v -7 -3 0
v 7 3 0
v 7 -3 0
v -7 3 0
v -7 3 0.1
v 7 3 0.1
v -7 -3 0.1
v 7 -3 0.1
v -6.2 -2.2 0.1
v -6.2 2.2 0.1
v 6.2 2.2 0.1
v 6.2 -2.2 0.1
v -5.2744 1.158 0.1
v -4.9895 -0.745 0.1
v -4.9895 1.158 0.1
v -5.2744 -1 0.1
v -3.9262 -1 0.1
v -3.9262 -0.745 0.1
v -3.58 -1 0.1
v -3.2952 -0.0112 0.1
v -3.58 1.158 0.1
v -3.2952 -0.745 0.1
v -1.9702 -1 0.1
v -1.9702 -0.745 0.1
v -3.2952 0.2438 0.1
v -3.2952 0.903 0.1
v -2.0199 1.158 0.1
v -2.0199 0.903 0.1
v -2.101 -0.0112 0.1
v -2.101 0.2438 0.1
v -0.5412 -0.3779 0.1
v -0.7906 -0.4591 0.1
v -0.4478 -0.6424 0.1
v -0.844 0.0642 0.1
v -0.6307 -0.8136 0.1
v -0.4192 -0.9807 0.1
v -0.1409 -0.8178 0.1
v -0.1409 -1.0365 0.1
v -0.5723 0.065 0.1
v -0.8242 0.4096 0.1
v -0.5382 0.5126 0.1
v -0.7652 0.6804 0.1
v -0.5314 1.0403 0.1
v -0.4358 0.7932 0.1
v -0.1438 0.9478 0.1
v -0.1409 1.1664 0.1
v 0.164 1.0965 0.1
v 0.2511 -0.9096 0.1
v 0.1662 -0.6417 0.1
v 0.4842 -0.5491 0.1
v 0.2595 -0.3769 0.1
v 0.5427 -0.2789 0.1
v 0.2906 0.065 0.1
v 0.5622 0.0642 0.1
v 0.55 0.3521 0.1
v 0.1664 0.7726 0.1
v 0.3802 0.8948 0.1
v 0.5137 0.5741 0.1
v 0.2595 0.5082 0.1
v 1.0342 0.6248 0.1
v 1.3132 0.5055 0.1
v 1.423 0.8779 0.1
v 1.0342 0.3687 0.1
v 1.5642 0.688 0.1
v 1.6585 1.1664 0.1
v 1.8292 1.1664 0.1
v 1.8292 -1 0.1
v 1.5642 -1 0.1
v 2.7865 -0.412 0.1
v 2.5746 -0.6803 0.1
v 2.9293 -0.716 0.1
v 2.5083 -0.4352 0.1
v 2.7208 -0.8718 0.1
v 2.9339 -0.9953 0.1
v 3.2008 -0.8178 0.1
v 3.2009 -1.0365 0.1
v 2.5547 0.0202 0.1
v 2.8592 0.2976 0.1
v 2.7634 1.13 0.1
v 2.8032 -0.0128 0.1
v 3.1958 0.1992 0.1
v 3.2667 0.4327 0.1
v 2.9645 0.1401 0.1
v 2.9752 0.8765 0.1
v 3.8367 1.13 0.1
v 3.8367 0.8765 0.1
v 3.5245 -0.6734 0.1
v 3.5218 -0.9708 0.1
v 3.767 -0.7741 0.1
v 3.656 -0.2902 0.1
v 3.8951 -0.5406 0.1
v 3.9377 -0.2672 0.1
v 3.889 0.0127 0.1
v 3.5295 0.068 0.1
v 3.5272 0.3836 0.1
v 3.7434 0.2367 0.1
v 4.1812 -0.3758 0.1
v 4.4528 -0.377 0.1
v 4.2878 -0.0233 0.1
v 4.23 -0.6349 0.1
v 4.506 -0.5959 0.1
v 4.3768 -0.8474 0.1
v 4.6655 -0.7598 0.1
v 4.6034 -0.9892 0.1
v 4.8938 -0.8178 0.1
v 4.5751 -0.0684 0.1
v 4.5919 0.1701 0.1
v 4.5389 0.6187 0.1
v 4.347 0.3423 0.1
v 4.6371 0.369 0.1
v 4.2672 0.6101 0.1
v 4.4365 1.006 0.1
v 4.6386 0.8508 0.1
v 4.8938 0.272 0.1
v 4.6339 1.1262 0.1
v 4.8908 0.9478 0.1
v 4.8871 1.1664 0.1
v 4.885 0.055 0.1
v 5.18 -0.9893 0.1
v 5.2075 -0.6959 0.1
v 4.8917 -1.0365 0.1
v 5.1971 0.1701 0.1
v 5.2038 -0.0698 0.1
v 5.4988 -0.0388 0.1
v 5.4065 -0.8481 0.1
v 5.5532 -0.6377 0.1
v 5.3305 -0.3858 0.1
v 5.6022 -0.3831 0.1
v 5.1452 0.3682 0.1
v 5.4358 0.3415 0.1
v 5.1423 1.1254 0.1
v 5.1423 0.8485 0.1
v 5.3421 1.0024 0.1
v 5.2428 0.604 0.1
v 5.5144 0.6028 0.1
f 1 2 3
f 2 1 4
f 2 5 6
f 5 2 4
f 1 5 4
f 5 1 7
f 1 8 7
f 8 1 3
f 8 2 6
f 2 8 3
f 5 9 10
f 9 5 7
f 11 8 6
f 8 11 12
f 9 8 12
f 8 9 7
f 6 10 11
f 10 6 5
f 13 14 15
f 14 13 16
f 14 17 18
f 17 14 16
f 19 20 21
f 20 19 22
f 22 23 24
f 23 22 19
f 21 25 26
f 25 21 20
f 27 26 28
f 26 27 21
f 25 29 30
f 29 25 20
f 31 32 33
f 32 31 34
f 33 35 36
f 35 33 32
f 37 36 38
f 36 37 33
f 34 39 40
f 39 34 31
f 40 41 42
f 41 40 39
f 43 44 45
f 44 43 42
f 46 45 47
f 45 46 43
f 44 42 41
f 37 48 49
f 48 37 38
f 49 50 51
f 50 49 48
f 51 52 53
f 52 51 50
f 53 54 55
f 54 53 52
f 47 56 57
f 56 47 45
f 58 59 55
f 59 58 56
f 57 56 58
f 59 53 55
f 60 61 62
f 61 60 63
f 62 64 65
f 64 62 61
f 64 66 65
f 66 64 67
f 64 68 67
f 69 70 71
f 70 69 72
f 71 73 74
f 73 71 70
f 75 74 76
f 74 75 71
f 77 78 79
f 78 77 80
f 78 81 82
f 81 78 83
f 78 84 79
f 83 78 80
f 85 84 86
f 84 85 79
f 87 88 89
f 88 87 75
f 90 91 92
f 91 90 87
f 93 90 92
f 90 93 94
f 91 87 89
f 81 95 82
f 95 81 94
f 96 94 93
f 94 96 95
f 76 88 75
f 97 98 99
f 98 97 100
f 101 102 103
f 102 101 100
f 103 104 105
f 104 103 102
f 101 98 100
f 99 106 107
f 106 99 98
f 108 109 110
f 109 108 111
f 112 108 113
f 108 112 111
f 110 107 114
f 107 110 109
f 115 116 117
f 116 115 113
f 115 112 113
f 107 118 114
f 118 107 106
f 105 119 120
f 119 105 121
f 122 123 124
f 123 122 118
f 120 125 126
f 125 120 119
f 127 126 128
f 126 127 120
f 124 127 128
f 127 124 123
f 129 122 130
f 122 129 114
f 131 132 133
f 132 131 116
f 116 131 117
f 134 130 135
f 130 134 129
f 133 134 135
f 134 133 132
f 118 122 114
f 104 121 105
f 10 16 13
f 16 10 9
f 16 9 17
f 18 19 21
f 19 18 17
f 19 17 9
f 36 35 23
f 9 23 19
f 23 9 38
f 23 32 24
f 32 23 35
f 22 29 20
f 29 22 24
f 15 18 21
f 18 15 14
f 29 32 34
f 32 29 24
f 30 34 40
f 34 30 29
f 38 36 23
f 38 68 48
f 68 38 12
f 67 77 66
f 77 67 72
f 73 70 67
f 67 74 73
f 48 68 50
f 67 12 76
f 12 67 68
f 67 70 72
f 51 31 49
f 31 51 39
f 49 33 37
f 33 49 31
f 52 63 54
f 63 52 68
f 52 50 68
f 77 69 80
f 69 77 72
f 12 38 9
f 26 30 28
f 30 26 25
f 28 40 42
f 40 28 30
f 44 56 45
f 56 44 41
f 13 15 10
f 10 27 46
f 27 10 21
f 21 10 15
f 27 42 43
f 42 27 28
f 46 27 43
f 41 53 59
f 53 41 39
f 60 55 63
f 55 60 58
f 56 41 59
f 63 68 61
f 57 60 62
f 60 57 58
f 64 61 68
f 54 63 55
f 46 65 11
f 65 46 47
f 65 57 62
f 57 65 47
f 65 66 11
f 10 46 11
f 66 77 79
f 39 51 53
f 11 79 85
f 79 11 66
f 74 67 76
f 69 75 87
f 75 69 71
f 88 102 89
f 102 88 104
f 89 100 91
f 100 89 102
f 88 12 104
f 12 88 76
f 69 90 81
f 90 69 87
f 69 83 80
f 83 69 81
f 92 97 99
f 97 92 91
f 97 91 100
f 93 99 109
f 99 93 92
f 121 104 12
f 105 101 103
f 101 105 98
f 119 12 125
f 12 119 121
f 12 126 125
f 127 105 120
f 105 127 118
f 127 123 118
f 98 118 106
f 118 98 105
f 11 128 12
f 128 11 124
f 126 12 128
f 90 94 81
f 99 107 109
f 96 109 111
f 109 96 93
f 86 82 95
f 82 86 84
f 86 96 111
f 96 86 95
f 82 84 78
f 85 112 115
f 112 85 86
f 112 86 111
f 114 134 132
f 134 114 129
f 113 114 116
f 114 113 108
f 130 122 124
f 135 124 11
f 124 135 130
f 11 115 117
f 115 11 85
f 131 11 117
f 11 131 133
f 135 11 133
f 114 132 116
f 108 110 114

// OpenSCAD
// file: ../p/box5-12.scad
use <../lib.scad>
function ldraw_lib__box5_12() = [
// 0 Box with 5 Faces without Any Edges
// 0 Name: box5-12.dat
// 0 Author: Chris Dee [cwdee]
// 0 !LDRAW_ORG Primitive UPDATE 2009-02
// 0 !LICENSE Licensed under CC BY 2.0 and CC BY 4.0 : see CAreadme.txt
// 
// 0 BFC CERTIFY CCW
  [0,"BFC","CERTIFY"],
  [0,"BFC","CCW"],
// 
// 0 !HISTORY 2009-09-03 [PTadmin] Official Update 2009-02
// 
// 
// 4 16 1 1 1 1 1 -1 -1 1 -1 -1 1 1
  [4,16,1,1,1,1,1,-1,-1,1,-1,-1,1,1],
// 4 16 -1 0 1 1 0 1 1 1 1 -1 1 1
  [4,16,-1,0,1,1,0,1,1,1,1,-1,1,1],
// 4 16 -1 0 -1 -1 0 1 -1 1 1 -1 1 -1
  [4,16,-1,0,-1,-1,0,1,-1,1,1,-1,1,-1],
// 4 16 1 0 -1 -1 0 -1 -1 1 -1 1 1 -1
  [4,16,1,0,-1,-1,0,-1,-1,1,-1,1,1,-1],
// 4 16 1 0 1 1 0 -1 1 1 -1 1 1 1
  [4,16,1,0,1,1,0,-1,1,1,-1,1,1,1],
// 0
];
makepoly(ldraw_lib__box5_12(), line=0.2);
// main file
use <../lib.scad>
use <../p/box5-12.scad>
function ldraw_lib__4521703g() = [
// 0 Sticker  0.8 x  1.8 with Black "LE 0158" and Border
// 0 Name: 4521703g.dat
// 0 Author: J.C. Tchang [tchang]
// 0 !LDRAW_ORG Part UPDATE 2012-01
// 0 !LICENSE Licensed under CC BY 2.0 and CC BY 4.0 : see CAreadme.txt
// 
// 0 BFC CERTIFY CCW
  [0,"BFC","CERTIFY"],
  [0,"BFC","CCW"],
// 
// 0 !HISTORY 2011-07-25 [PTadmin] Official Update 2011-01
// 0 !HISTORY 2012-01-09 [cwdee] Corrected dimensions
// 0 !HISTORY 2012-03-30 [PTadmin] Official Update 2012-01
// 
// 
// 1 16 0 -0.25 0 17.5 0 0 0 0.25 0 0 0 7.5 box5-12.dat
  [1,16,0,-0.25,0,17.5,0,0,0,0.25,0,0,0,7.5, ldraw_lib__box5_12()],
// 4 0 -15.5 -0.25 -5.5 -15.5 -0.25 5.5 -17.5 -0.25 7.5 -17.5 -0.25 -7.5
  [4,0,-15.5,-0.25,-5.5,-15.5,-0.25,5.5,-17.5,-0.25,7.5,-17.5,-0.25,-7.5],
// 4 0 15.5 -0.25 5.5 15.5 -0.25 -5.5 17.5 -0.25 -7.5 17.5 -0.25 7.5
  [4,0,15.5,-0.25,5.5,15.5,-0.25,-5.5,17.5,-0.25,-7.5,17.5,-0.25,7.5],
// 4 0 15.5 -0.25 -5.5 -15.5 -0.25 -5.5 -17.5 -0.25 -7.5 17.5 -0.25 -7.5
  [4,0,15.5,-0.25,-5.5,-15.5,-0.25,-5.5,-17.5,-0.25,-7.5,17.5,-0.25,-7.5],
// 4 0 -15.5 -0.25 5.5 15.5 -0.25 5.5 17.5 -0.25 7.5 -17.5 -0.25 7.5
  [4,0,-15.5,-0.25,5.5,15.5,-0.25,5.5,17.5,-0.25,7.5,-17.5,-0.25,7.5],
// 0 //
// 4 0 -13.1861 -0.25 2.8951 -13.1861 -0.25 -2.5 -12.4738 -0.25 -1.8624 -12.4738 -0.25 2.8951
  [4,0,-13.1861,-0.25,2.8951,-13.1861,-0.25,-2.5,-12.4738,-0.25,-1.8624,-12.4738,-0.25,2.8951],
// 4 0 -12.4738 -0.25 -1.8624 -13.1861 -0.25 -2.5 -9.8156 -0.25 -2.5 -9.8156 -0.25 -1.8624
  [4,0,-12.4738,-0.25,-1.8624,-13.1861,-0.25,-2.5,-9.8156,-0.25,-2.5,-9.8156,-0.25,-1.8624],
// 4 0 -8.9501 -0.25 -2.5 -8.238 -0.25 -1.8624 -8.238 -0.25 -0.0281 -8.9501 -0.25 2.8951
  [4,0,-8.9501,-0.25,-2.5,-8.238,-0.25,-1.8624,-8.238,-0.25,-0.0281,-8.9501,-0.25,2.8951],
// 4 0 -8.238 -0.25 -1.8624 -8.9501 -0.25 -2.5 -4.9255 -0.25 -2.5 -4.9255 -0.25 -1.8624
  [4,0,-8.238,-0.25,-1.8624,-8.9501,-0.25,-2.5,-4.9255,-0.25,-2.5,-4.9255,-0.25,-1.8624],
// 3 0 -8.9501 -0.25 2.8951 -8.238 -0.25 0.6095 -8.238 -0.25 2.2575
  [3,0,-8.9501,-0.25,2.8951,-8.238,-0.25,0.6095,-8.238,-0.25,2.2575],
// 3 0 -8.238 -0.25 0.6095 -8.9501 -0.25 2.8951 -8.238 -0.25 -0.0281
  [3,0,-8.238,-0.25,0.6095,-8.9501,-0.25,2.8951,-8.238,-0.25,-0.0281],
// 4 0 -5.0498 -0.25 2.8951 -8.9501 -0.25 2.8951 -8.238 -0.25 2.2575 -5.0498 -0.25 2.2575
  [4,0,-5.0498,-0.25,2.8951,-8.9501,-0.25,2.8951,-8.238,-0.25,2.2575,-5.0498,-0.25,2.2575],
// 4 0 -8.238 -0.25 0.6095 -8.238 -0.25 -0.0281 -5.2525 -0.25 -0.0281 -5.2525 -0.25 0.6095
  [4,0,-8.238,-0.25,0.6095,-8.238,-0.25,-0.0281,-5.2525,-0.25,-0.0281,-5.2525,-0.25,0.6095],
// 4 0 -1.3531 -0.25 -0.9447 -2.1099 -0.25 0.1606 -1.9766 -0.25 -1.1477 -1.1196 -0.25 -1.6059
  [4,0,-1.3531,-0.25,-0.9447,-2.1099,-0.25,0.1606,-1.9766,-0.25,-1.1477,-1.1196,-0.25,-1.6059],
// 4 0 -1.1196 -0.25 -1.6059 -1.9766 -0.25 -1.1477 -1.5767 -0.25 -2.0339 -1.0481 -0.25 -2.4518
  [4,0,-1.1196,-0.25,-1.6059,-1.9766,-0.25,-1.1477,-1.5767,-0.25,-2.0339,-1.0481,-0.25,-2.4518],
// 4 0 -0.3522 -0.25 -2.0445 -1.1196 -0.25 -1.6059 -1.0481 -0.25 -2.4518 -0.3522 -0.25 -2.5912
  [4,0,-0.3522,-0.25,-2.0445,-1.1196,-0.25,-1.6059,-1.0481,-0.25,-2.4518,-0.3522,-0.25,-2.5912],
// 4 0 -2.1099 -0.25 0.1606 -1.3531 -0.25 -0.9447 -1.4307 -0.25 0.1625 -2.0606 -0.25 1.024
  [4,0,-2.1099,-0.25,0.1606,-1.3531,-0.25,-0.9447,-1.4307,-0.25,0.1625,-2.0606,-0.25,1.024],
// 4 0 -1.3454 -0.25 1.2815 -1.913 -0.25 1.701 -2.0606 -0.25 1.024 -1.4307 -0.25 0.1625
  [4,0,-1.3454,-0.25,1.2815,-1.913,-0.25,1.701,-2.0606,-0.25,1.024,-1.4307,-0.25,0.1625],
// 4 0 -1.3284 -0.25 2.6007 -1.913 -0.25 1.701 -1.0894 -0.25 1.983 -0.3596 -0.25 2.3694
  [4,0,-1.3284,-0.25,2.6007,-1.913,-0.25,1.701,-1.0894,-0.25,1.983,-0.3596,-0.25,2.3694],
// 4 0 -0.3522 -0.25 2.9161 -1.3284 -0.25 2.6007 -0.3596 -0.25 2.3694 0.41 -0.25 2.7412
  [4,0,-0.3522,-0.25,2.9161,-1.3284,-0.25,2.6007,-0.3596,-0.25,2.3694,0.41,-0.25,2.7412],
// 3 0 -1.0894 -0.25 1.983 -1.913 -0.25 1.701 -1.3454 -0.25 1.2815
  [3,0,-1.0894,-0.25,1.983,-1.913,-0.25,1.701,-1.3454,-0.25,1.2815],
// 4 0 0.6278 -0.25 -2.274 0.4155 -0.25 -1.6043 -0.3522 -0.25 -2.0445 -0.3522 -0.25 -2.5912
  [4,0,0.6278,-0.25,-2.274,0.4155,-0.25,-1.6043,-0.3522,-0.25,-2.0445,-0.3522,-0.25,-2.5912],
// 4 0 0.4155 -0.25 -1.6043 0.6278 -0.25 -2.274 1.2105 -0.25 -1.3727 0.6487 -0.25 -0.9423
  [4,0,0.4155,-0.25,-1.6043,0.6278,-0.25,-2.274,1.2105,-0.25,-1.3727,0.6487,-0.25,-0.9423],
// 4 0 0.6487 -0.25 -0.9423 1.2105 -0.25 -1.3727 1.3568 -0.25 -0.6972 0.7264 -0.25 0.1625
  [4,0,0.6487,-0.25,-0.9423,1.2105,-0.25,-1.3727,1.3568,-0.25,-0.6972,0.7264,-0.25,0.1625],
// 4 0 0.7264 -0.25 0.1625 1.3568 -0.25 -0.6972 1.4056 -0.25 0.1606 1.3751 -0.25 0.8803
  [4,0,0.7264,-0.25,0.1625,1.3568,-0.25,-0.6972,1.4056,-0.25,0.1606,1.3751,-0.25,0.8803],
// 4 0 0.4161 -0.25 1.9316 0.9506 -0.25 2.2371 0.41 -0.25 2.7412 -0.3596 -0.25 2.3694
  [4,0,0.4161,-0.25,1.9316,0.9506,-0.25,2.2371,0.41,-0.25,2.7412,-0.3596,-0.25,2.3694],
// 4 0 1.2842 -0.25 1.4353 0.4161 -0.25 1.9316 0.6487 -0.25 1.2704 1.3751 -0.25 0.8803
  [4,0,1.2842,-0.25,1.4353,0.4161,-0.25,1.9316,0.6487,-0.25,1.2704,1.3751,-0.25,0.8803],
// 3 0 0.9506 -0.25 2.2371 0.4161 -0.25 1.9316 1.2842 -0.25 1.4353
  [3,0,0.9506,-0.25,2.2371,0.4161,-0.25,1.9316,1.2842,-0.25,1.4353],
// 3 0 0.6487 -0.25 1.2704 0.7264 -0.25 0.1625 1.3751 -0.25 0.8803
  [3,0,0.6487,-0.25,1.2704,0.7264,-0.25,0.1625,1.3751,-0.25,0.8803],
// 4 0 2.5856 -0.25 1.5619 2.5856 -0.25 0.9217 3.2831 -0.25 1.2638 3.5574 -0.25 2.1947
  [4,0,2.5856,-0.25,1.5619,2.5856,-0.25,0.9217,3.2831,-0.25,1.2638,3.5574,-0.25,2.1947],
// 4 0 3.5574 -0.25 2.1947 3.2831 -0.25 1.2638 3.9106 -0.25 1.7201 4.1462 -0.25 2.9161
  [4,0,3.5574,-0.25,2.1947,3.2831,-0.25,1.2638,3.9106,-0.25,1.7201,4.1462,-0.25,2.9161],
// 4 0 4.5731 -0.25 2.9161 4.1462 -0.25 2.9161 3.9106 -0.25 1.7201 4.5731 -0.25 -2.5
  [4,0,4.5731,-0.25,2.9161,4.1462,-0.25,2.9161,3.9106,-0.25,1.7201,4.5731,-0.25,-2.5],
// 3 0 3.9106 -0.25 1.7201 3.9106 -0.25 -2.5 4.5731 -0.25 -2.5
  [3,0,3.9106,-0.25,1.7201,3.9106,-0.25,-2.5,4.5731,-0.25,-2.5],
// 4 0 6.9663 -0.25 -1.03 6.2707 -0.25 -1.0881 6.4366 -0.25 -1.7008 7.3233 -0.25 -1.7901
  [4,0,6.9663,-0.25,-1.03,6.2707,-0.25,-1.0881,6.4366,-0.25,-1.7008,7.3233,-0.25,-1.7901],
// 4 0 7.3233 -0.25 -1.7901 6.4366 -0.25 -1.7008 6.802 -0.25 -2.1796 7.3347 -0.25 -2.4883
  [4,0,7.3233,-0.25,-1.7901,6.4366,-0.25,-1.7008,6.802,-0.25,-2.1796,7.3347,-0.25,-2.4883],
// 4 0 8.002 -0.25 -2.0445 7.3233 -0.25 -1.7901 7.3347 -0.25 -2.4883 8.0022 -0.25 -2.5912
  [4,0,8.002,-0.25,-2.0445,7.3233,-0.25,-1.7901,7.3347,-0.25,-2.4883,8.0022,-0.25,-2.5912],
// 4 0 7.1479 -0.25 0.7439 6.9086 -0.25 2.8249 6.3868 -0.25 0.0506 7.0079 -0.25 -0.0321
  [4,0,7.1479,-0.25,0.7439,6.9086,-0.25,2.8249,6.3868,-0.25,0.0506,7.0079,-0.25,-0.0321],
// 4 0 7.1479 -0.25 0.7439 7.4113 -0.25 0.3503 7.9895 -0.25 0.4979 8.1668 -0.25 1.0817
  [4,0,7.1479,-0.25,0.7439,7.4113,-0.25,0.3503,7.9895,-0.25,0.4979,8.1668,-0.25,1.0817],
// 3 0 7.1479 -0.25 0.7439 7.438 -0.25 2.1913 6.9086 -0.25 2.8249
  [3,0,7.1479,-0.25,0.7439,7.438,-0.25,2.1913,6.9086,-0.25,2.8249],
// 3 0 7.4113 -0.25 0.3503 7.1479 -0.25 0.7439 7.0079 -0.25 -0.0321
  [3,0,7.4113,-0.25,0.3503,7.1479,-0.25,0.7439,7.0079,-0.25,-0.0321],
// 4 0 9.5917 -0.25 2.8249 6.9086 -0.25 2.8249 7.438 -0.25 2.1913 9.5917 -0.25 2.1913
  [4,0,9.5917,-0.25,2.8249,6.9086,-0.25,2.8249,7.438,-0.25,2.1913,9.5917,-0.25,2.1913],
// 4 0 8.8113 -0.25 -1.6835 8.002 -0.25 -2.0445 8.8046 -0.25 -2.4271 9.4176 -0.25 -1.9353
  [4,0,8.8113,-0.25,-1.6835,8.002,-0.25,-2.0445,8.8046,-0.25,-2.4271,9.4176,-0.25,-1.9353],
// 4 0 9.1401 -0.25 -0.7256 8.8113 -0.25 -1.6835 9.7377 -0.25 -1.3515 9.8442 -0.25 -0.6681
  [4,0,9.1401,-0.25,-0.7256,8.8113,-0.25,-1.6835,9.7377,-0.25,-1.3515,9.8442,-0.25,-0.6681],
// 4 0 9.1401 -0.25 -0.7256 9.8442 -0.25 -0.6681 9.7226 -0.25 0.0318 8.8237 -0.25 0.1699
  [4,0,9.1401,-0.25,-0.7256,9.8442,-0.25,-0.6681,9.7226,-0.25,0.0318,8.8237,-0.25,0.1699],
// 3 0 9.7377 -0.25 -1.3515 8.8113 -0.25 -1.6835 9.4176 -0.25 -1.9353
  [3,0,9.7377,-0.25,-1.3515,8.8113,-0.25,-1.6835,9.4176,-0.25,-1.9353],
// 4 0 8.8179 -0.25 0.959 8.1668 -0.25 1.0817 7.9895 -0.25 0.4979 8.8237 -0.25 0.1699
  [4,0,8.8179,-0.25,0.959,8.1668,-0.25,1.0817,7.9895,-0.25,0.4979,8.8237,-0.25,0.1699],
// 4 0 9.3585 -0.25 0.5918 8.8179 -0.25 0.959 8.8237 -0.25 0.1699 9.7226 -0.25 0.0318
  [4,0,9.3585,-0.25,0.5918,8.8179,-0.25,0.959,8.8237,-0.25,0.1699,9.7226,-0.25,0.0318],
// 3 0 8.0022 -0.25 -2.5912 8.8046 -0.25 -2.4271 8.002 -0.25 -2.0445
  [3,0,8.0022,-0.25,-2.5912,8.8046,-0.25,-2.4271,8.002,-0.25,-2.0445],
// 4 0 10.4529 -0.25 -0.9394 10.5751 -0.25 -1.5873 11.1319 -0.25 -0.9426 10.7195 -0.25 -0.0583
  [4,0,10.4529,-0.25,-0.9394,10.5751,-0.25,-1.5873,11.1319,-0.25,-0.9426,10.7195,-0.25,-0.0583],
// 4 0 11.2649 -0.25 -1.4898 10.5751 -0.25 -1.5873 10.9419 -0.25 -2.1184 11.6637 -0.25 -1.8995
  [4,0,11.2649,-0.25,-1.4898,10.5751,-0.25,-1.5873,10.9419,-0.25,-2.1184,11.6637,-0.25,-1.8995],
// 4 0 11.5084 -0.25 -2.473 12.2345 -0.25 -2.0445 11.6637 -0.25 -1.8995 10.9419 -0.25 -2.1184
  [4,0,11.5084,-0.25,-2.473,12.2345,-0.25,-2.0445,11.6637,-0.25,-1.8995,10.9419,-0.25,-2.1184],
// 3 0 11.2649 -0.25 -1.4898 11.1319 -0.25 -0.9426 10.5751 -0.25 -1.5873
  [3,0,11.2649,-0.25,-1.4898,11.1319,-0.25,-0.9426,10.5751,-0.25,-1.5873],
// 4 0 10.7195 -0.25 -0.0583 11.1319 -0.25 -0.9426 11.4377 -0.25 -0.1709 11.4798 -0.25 0.4253
  [4,0,10.7195,-0.25,-0.0583,11.1319,-0.25,-0.9426,11.4377,-0.25,-0.1709,11.4798,-0.25,0.4253],
// 4 0 10.8674 -0.25 0.8557 11.5927 -0.25 0.9225 11.3473 -0.25 1.5468 10.6681 -0.25 1.5253
  [4,0,10.8674,-0.25,0.8557,11.5927,-0.25,0.9225,11.3473,-0.25,1.5468,10.6681,-0.25,1.5253],
// 4 0 11.0913 -0.25 2.5149 10.6681 -0.25 1.5253 11.3473 -0.25 1.5468 11.5964 -0.25 2.1269
  [4,0,11.0913,-0.25,2.5149,10.6681,-0.25,1.5253,11.3473,-0.25,1.5468,11.5964,-0.25,2.1269],
// 4 0 11.5927 -0.25 0.9225 10.8674 -0.25 0.8557 11.4798 -0.25 0.4253 12.2345 -0.25 0.68
  [4,0,11.5927,-0.25,0.9225,10.8674,-0.25,0.8557,11.4798,-0.25,0.4253,12.2345,-0.25,0.68],
// 4 0 12.2271 -0.25 2.3694 12.2178 -0.25 2.9161 11.5848 -0.25 2.8156 11.5964 -0.25 2.1269
  [4,0,12.2271,-0.25,2.3694,12.2178,-0.25,2.9161,11.5848,-0.25,2.8156,11.5964,-0.25,2.1269],
// 3 0 11.5848 -0.25 2.8156 11.0913 -0.25 2.5149 11.5964 -0.25 2.1269
  [3,0,11.5848,-0.25,2.8156,11.0913,-0.25,2.5149,11.5964,-0.25,2.1269],
// 4 0 12.2125 -0.25 0.1375 12.2345 -0.25 0.68 11.4798 -0.25 0.4253 11.4377 -0.25 -0.1709
  [4,0,12.2125,-0.25,0.1375,12.2345,-0.25,0.68,11.4798,-0.25,0.4253,11.4377,-0.25,-0.1709],
// 4 0 12.2345 -0.25 -2.0445 12.2292 -0.25 -2.5912 12.95 -0.25 -2.4732 13.0187 -0.25 -1.7397
  [4,0,12.2345,-0.25,-2.0445,12.2292,-0.25,-2.5912,12.95,-0.25,-2.4732,13.0187,-0.25,-1.7397],
// 4 0 12.9927 -0.25 0.4253 12.2125 -0.25 0.1375 13.0094 -0.25 -0.1746 13.7469 -0.25 -0.097
  [4,0,12.9927,-0.25,0.4253,12.2125,-0.25,0.1375,13.0094,-0.25,-0.1746,13.7469,-0.25,-0.097],
// 4 0 13.0187 -0.25 -1.7397 12.95 -0.25 -2.4732 13.5163 -0.25 -2.1203 13.8831 -0.25 -1.5942
  [4,0,13.0187,-0.25,-1.7397,12.95,-0.25,-2.4732,13.5163,-0.25,-2.1203,13.8831,-0.25,-1.5942],
// 4 0 13.3263 -0.25 -0.9646 13.0187 -0.25 -1.7397 13.8831 -0.25 -1.5942 14.0055 -0.25 -0.9577
  [4,0,13.3263,-0.25,-0.9646,13.0187,-0.25,-1.7397,13.8831,-0.25,-1.5942,14.0055,-0.25,-0.9577],
// 4 0 13.3263 -0.25 -0.9646 14.0055 -0.25 -0.9577 13.7469 -0.25 -0.097 13.0094 -0.25 -0.1746
  [4,0,13.3263,-0.25,-0.9646,14.0055,-0.25,-0.9577,13.7469,-0.25,-0.097,13.0094,-0.25,-0.1746],
// 4 0 12.8631 -0.25 0.9206 12.2345 -0.25 0.68 12.9927 -0.25 0.4253 13.5895 -0.25 0.8538
  [4,0,12.8631,-0.25,0.9206,12.2345,-0.25,0.68,12.9927,-0.25,0.4253,13.5895,-0.25,0.8538],
// 4 0 12.8557 -0.25 2.8135 12.2271 -0.25 2.3694 12.8557 -0.25 2.1213 13.3552 -0.25 2.5059
  [4,0,12.8557,-0.25,2.8135,12.2271,-0.25,2.3694,12.8557,-0.25,2.1213,13.3552,-0.25,2.5059],
// 3 0 12.2271 -0.25 2.3694 12.8557 -0.25 2.8135 12.2178 -0.25 2.9161
  [3,0,12.2271,-0.25,2.3694,12.8557,-0.25,2.8135,12.2178,-0.25,2.9161],
// 4 0 13.1069 -0.25 1.51 12.8631 -0.25 0.9206 13.5895 -0.25 0.8538 13.7861 -0.25 1.5071
  [4,0,13.1069,-0.25,1.51,12.8631,-0.25,0.9206,13.5895,-0.25,0.8538,13.7861,-0.25,1.5071],
// 4 0 13.1069 -0.25 1.51 13.7861 -0.25 1.5071 13.3552 -0.25 2.5059 12.8557 -0.25 2.1213
  [4,0,13.1069,-0.25,1.51,13.7861,-0.25,1.5071,13.3552,-0.25,2.5059,12.8557,-0.25,2.1213],
// 3 0 12.2125 -0.25 0.1375 12.9927 -0.25 0.4253 12.2345 -0.25 0.68
  [3,0,12.2125,-0.25,0.1375,12.9927,-0.25,0.4253,12.2345,-0.25,0.68],
// 3 0 11.5084 -0.25 -2.473 12.2292 -0.25 -2.5912 12.2345 -0.25 -2.0445
  [3,0,11.5084,-0.25,-2.473,12.2292,-0.25,-2.5912,12.2345,-0.25,-2.0445],
// 4 15 -15.5 -0.25 5.5 -15.5 -0.25 -5.5 -13.1861 -0.25 -2.5 -13.1861 -0.25 2.8951
  [4,15,-15.5,-0.25,5.5,-15.5,-0.25,-5.5,-13.1861,-0.25,-2.5,-13.1861,-0.25,2.8951],
// 3 15 -13.1861 -0.25 -2.5 -15.5 -0.25 -5.5 -9.8156 -0.25 -2.5
  [3,15,-13.1861,-0.25,-2.5,-15.5,-0.25,-5.5,-9.8156,-0.25,-2.5],
// 4 15 -9.8156 -0.25 -1.8624 -9.8156 -0.25 -2.5 -8.9501 -0.25 -2.5 -8.9501 -0.25 2.8951
  [4,15,-9.8156,-0.25,-1.8624,-9.8156,-0.25,-2.5,-8.9501,-0.25,-2.5,-8.9501,-0.25,2.8951],
// 3 15 -8.9501 -0.25 -2.5 -9.8156 -0.25 -2.5 -15.5 -0.25 -5.5
  [3,15,-8.9501,-0.25,-2.5,-9.8156,-0.25,-2.5,-15.5,-0.25,-5.5],
// 3 15 -1.0481 -0.25 -2.4518 -1.5767 -0.25 -2.0339 -4.9255 -0.25 -2.5
  [3,15,-1.0481,-0.25,-2.4518,-1.5767,-0.25,-2.0339,-4.9255,-0.25,-2.5],
// 4 15 -4.9255 -0.25 -2.5 -8.9501 -0.25 -2.5 -15.5 -0.25 -5.5 -0.3522 -0.25 -2.5912
  [4,15,-4.9255,-0.25,-2.5,-8.9501,-0.25,-2.5,-15.5,-0.25,-5.5,-0.3522,-0.25,-2.5912],
// 4 15 -4.9255 -0.25 -2.5 -1.5767 -0.25 -2.0339 -1.9766 -0.25 -1.1477 -4.9255 -0.25 -1.8624
  [4,15,-4.9255,-0.25,-2.5,-1.5767,-0.25,-2.0339,-1.9766,-0.25,-1.1477,-4.9255,-0.25,-1.8624],
// 4 15 -5.2525 -0.25 -0.0281 -8.238 -0.25 -0.0281 -8.238 -0.25 -1.8624 -4.9255 -0.25 -1.8624
  [4,15,-5.2525,-0.25,-0.0281,-8.238,-0.25,-0.0281,-8.238,-0.25,-1.8624,-4.9255,-0.25,-1.8624],
// 4 15 -12.4738 -0.25 2.8951 -12.4738 -0.25 -1.8624 -9.8156 -0.25 -1.8624 -8.9501 -0.25 2.8951
  [4,15,-12.4738,-0.25,2.8951,-12.4738,-0.25,-1.8624,-9.8156,-0.25,-1.8624,-8.9501,-0.25,2.8951],
// 4 15 -1.9766 -0.25 -1.1477 -2.1099 -0.25 0.1606 -5.2525 -0.25 -0.0281 -4.9255 -0.25 -1.8624
  [4,15,-1.9766,-0.25,-1.1477,-2.1099,-0.25,0.1606,-5.2525,-0.25,-0.0281,-4.9255,-0.25,-1.8624],
// 4 15 -5.2525 -0.25 0.6095 -5.2525 -0.25 -0.0281 -2.1099 -0.25 0.1606 -2.0606 -0.25 1.024
  [4,15,-5.2525,-0.25,0.6095,-5.2525,-0.25,-0.0281,-2.1099,-0.25,0.1606,-2.0606,-0.25,1.024],
// 3 15 -0.3522 -0.25 -2.5912 -1.0481 -0.25 -2.4518 -4.9255 -0.25 -2.5
  [3,15,-0.3522,-0.25,-2.5912,-1.0481,-0.25,-2.4518,-4.9255,-0.25,-2.5],
// 4 15 3.9106 -0.25 -2.5 0.6278 -0.25 -2.274 -0.3522 -0.25 -2.5912 15.5 -0.25 -5.5
  [4,15,3.9106,-0.25,-2.5,0.6278,-0.25,-2.274,-0.3522,-0.25,-2.5912,15.5,-0.25,-5.5],
// 4 15 4.5731 -0.25 -2.5 6.2707 -0.25 -1.0881 6.3868 -0.25 0.0506 4.5731 -0.25 2.9161
  [4,15,4.5731,-0.25,-2.5,6.2707,-0.25,-1.0881,6.3868,-0.25,0.0506,4.5731,-0.25,2.9161],
// 3 15 6.802 -0.25 -2.1796 6.4366 -0.25 -1.7008 4.5731 -0.25 -2.5
  [3,15,6.802,-0.25,-2.1796,6.4366,-0.25,-1.7008,4.5731,-0.25,-2.5],
// 3 15 4.5731 -0.25 -2.5 7.3347 -0.25 -2.4883 6.802 -0.25 -2.1796
  [3,15,4.5731,-0.25,-2.5,7.3347,-0.25,-2.4883,6.802,-0.25,-2.1796],
// 3 15 0.6278 -0.25 -2.274 3.9106 -0.25 -2.5 1.2105 -0.25 -1.3727
  [3,15,0.6278,-0.25,-2.274,3.9106,-0.25,-2.5,1.2105,-0.25,-1.3727],
// 4 15 4.5731 -0.25 -2.5 3.9106 -0.25 -2.5 15.5 -0.25 -5.5 8.0022 -0.25 -2.5912
  [4,15,4.5731,-0.25,-2.5,3.9106,-0.25,-2.5,15.5,-0.25,-5.5,8.0022,-0.25,-2.5912],
// 3 15 4.5731 -0.25 -2.5 6.4366 -0.25 -1.7008 6.2707 -0.25 -1.0881
  [3,15,4.5731,-0.25,-2.5,6.4366,-0.25,-1.7008,6.2707,-0.25,-1.0881],
// 4 15 -1.3531 -0.25 -0.9447 0.4155 -0.25 -1.6043 0.6487 -0.25 -0.9423 -1.4307 -0.25 0.1625
  [4,15,-1.3531,-0.25,-0.9447,0.4155,-0.25,-1.6043,0.6487,-0.25,-0.9423,-1.4307,-0.25,0.1625],
// 4 15 -1.1196 -0.25 -1.6059 -0.3522 -0.25 -2.0445 0.4155 -0.25 -1.6043 -1.3531 -0.25 -0.9447
  [4,15,-1.1196,-0.25,-1.6059,-0.3522,-0.25,-2.0445,0.4155,-0.25,-1.6043,-1.3531,-0.25,-0.9447],
// 4 15 2.5856 -0.25 0.9217 1.4056 -0.25 0.1606 1.3568 -0.25 -0.6972 3.9106 -0.25 -2.5
  [4,15,2.5856,-0.25,0.9217,1.4056,-0.25,0.1606,1.3568,-0.25,-0.6972,3.9106,-0.25,-2.5],
// 3 15 1.3568 -0.25 -0.6972 1.2105 -0.25 -1.3727 3.9106 -0.25 -2.5
  [3,15,1.3568,-0.25,-0.6972,1.2105,-0.25,-1.3727,3.9106,-0.25,-2.5],
// 4 15 6.3868 -0.25 0.0506 6.2707 -0.25 -1.0881 6.9663 -0.25 -1.03 7.0079 -0.25 -0.0321
  [4,15,6.3868,-0.25,0.0506,6.2707,-0.25,-1.0881,6.9663,-0.25,-1.03,7.0079,-0.25,-0.0321],
// 3 15 15.5 -0.25 -5.5 -0.3522 -0.25 -2.5912 -15.5 -0.25 -5.5
  [3,15,15.5,-0.25,-5.5,-0.3522,-0.25,-2.5912,-15.5,-0.25,-5.5],
// 4 15 -8.238 -0.25 2.2575 -8.238 -0.25 0.6095 -5.2525 -0.25 0.6095 -5.0498 -0.25 2.2575
  [4,15,-8.238,-0.25,2.2575,-8.238,-0.25,0.6095,-5.2525,-0.25,0.6095,-5.0498,-0.25,2.2575],
// 4 15 -5.0498 -0.25 2.2575 -5.2525 -0.25 0.6095 -2.0606 -0.25 1.024 -1.913 -0.25 1.701
  [4,15,-5.0498,-0.25,2.2575,-5.2525,-0.25,0.6095,-2.0606,-0.25,1.024,-1.913,-0.25,1.701],
// 4 15 0.4161 -0.25 1.9316 -0.3596 -0.25 2.3694 -1.0894 -0.25 1.983 -1.3454 -0.25 1.2815
  [4,15,0.4161,-0.25,1.9316,-0.3596,-0.25,2.3694,-1.0894,-0.25,1.983,-1.3454,-0.25,1.2815],
// 3 15 -13.1861 -0.25 2.8951 -12.4738 -0.25 2.8951 -15.5 -0.25 5.5
  [3,15,-13.1861,-0.25,2.8951,-12.4738,-0.25,2.8951,-15.5,-0.25,5.5],
// 4 15 -15.5 -0.25 5.5 -8.9501 -0.25 2.8951 -5.0498 -0.25 2.8951 -0.3522 -0.25 2.9161
  [4,15,-15.5,-0.25,5.5,-8.9501,-0.25,2.8951,-5.0498,-0.25,2.8951,-0.3522,-0.25,2.9161],
// 3 15 -8.9501 -0.25 2.8951 -15.5 -0.25 5.5 -12.4738 -0.25 2.8951
  [3,15,-8.9501,-0.25,2.8951,-15.5,-0.25,5.5,-12.4738,-0.25,2.8951],
// 4 15 -1.913 -0.25 1.701 -1.3284 -0.25 2.6007 -5.0498 -0.25 2.8951 -5.0498 -0.25 2.2575
  [4,15,-1.913,-0.25,1.701,-1.3284,-0.25,2.6007,-5.0498,-0.25,2.8951,-5.0498,-0.25,2.2575],
// 3 15 -0.3522 -0.25 2.9161 -5.0498 -0.25 2.8951 -1.3284 -0.25 2.6007
  [3,15,-0.3522,-0.25,2.9161,-5.0498,-0.25,2.8951,-1.3284,-0.25,2.6007],
// 4 15 -1.3454 -0.25 1.2815 -1.4307 -0.25 0.1625 0.7264 -0.25 0.1625 0.6487 -0.25 1.2704
  [4,15,-1.3454,-0.25,1.2815,-1.4307,-0.25,0.1625,0.7264,-0.25,0.1625,0.6487,-0.25,1.2704],
// 4 15 2.5856 -0.25 1.5619 1.2842 -0.25 1.4353 1.3751 -0.25 0.8803 2.5856 -0.25 0.9217
  [4,15,2.5856,-0.25,1.5619,1.2842,-0.25,1.4353,1.3751,-0.25,0.8803,2.5856,-0.25,0.9217],
// 3 15 0.4161 -0.25 1.9316 -1.3454 -0.25 1.2815 0.6487 -0.25 1.2704
  [3,15,0.4161,-0.25,1.9316,-1.3454,-0.25,1.2815,0.6487,-0.25,1.2704],
// 3 15 2.5856 -0.25 0.9217 3.9106 -0.25 -2.5 3.2831 -0.25 1.2638
  [3,15,2.5856,-0.25,0.9217,3.9106,-0.25,-2.5,3.2831,-0.25,1.2638],
// 4 15 0.9506 -0.25 2.2371 1.2842 -0.25 1.4353 2.5856 -0.25 1.5619 3.5574 -0.25 2.1947
  [4,15,0.9506,-0.25,2.2371,1.2842,-0.25,1.4353,2.5856,-0.25,1.5619,3.5574,-0.25,2.1947],
// 3 15 3.9106 -0.25 1.7201 3.2831 -0.25 1.2638 3.9106 -0.25 -2.5
  [3,15,3.9106,-0.25,1.7201,3.2831,-0.25,1.2638,3.9106,-0.25,-2.5],
// 3 15 1.4056 -0.25 0.1606 2.5856 -0.25 0.9217 1.3751 -0.25 0.8803
  [3,15,1.4056,-0.25,0.1606,2.5856,-0.25,0.9217,1.3751,-0.25,0.8803],
// 4 15 -0.3522 -0.25 2.9161 0.41 -0.25 2.7412 4.1462 -0.25 2.9161 15.5 -0.25 5.5
  [4,15,-0.3522,-0.25,2.9161,0.41,-0.25,2.7412,4.1462,-0.25,2.9161,15.5,-0.25,5.5],
// 4 15 4.1462 -0.25 2.9161 0.41 -0.25 2.7412 0.9506 -0.25 2.2371 3.5574 -0.25 2.1947
  [4,15,4.1462,-0.25,2.9161,0.41,-0.25,2.7412,0.9506,-0.25,2.2371,3.5574,-0.25,2.1947],
// 3 15 4.1462 -0.25 2.9161 4.5731 -0.25 2.9161 15.5 -0.25 5.5
  [3,15,4.1462,-0.25,2.9161,4.5731,-0.25,2.9161,15.5,-0.25,5.5],
// 3 15 -15.5 -0.25 5.5 -0.3522 -0.25 2.9161 15.5 -0.25 5.5
  [3,15,-15.5,-0.25,5.5,-0.3522,-0.25,2.9161,15.5,-0.25,5.5],
// 3 15 4.5731 -0.25 2.9161 6.3868 -0.25 0.0506 6.9086 -0.25 2.8249
  [3,15,4.5731,-0.25,2.9161,6.3868,-0.25,0.0506,6.9086,-0.25,2.8249],
// 3 15 -1.4307 -0.25 0.1625 0.6487 -0.25 -0.9423 0.7264 -0.25 0.1625
  [3,15,-1.4307,-0.25,0.1625,0.6487,-0.25,-0.9423,0.7264,-0.25,0.1625],
// 4 15 15.5 -0.25 5.5 4.5731 -0.25 2.9161 6.9086 -0.25 2.8249 9.5917 -0.25 2.8249
  [4,15,15.5,-0.25,5.5,4.5731,-0.25,2.9161,6.9086,-0.25,2.8249,9.5917,-0.25,2.8249],
// 3 15 7.3347 -0.25 -2.4883 4.5731 -0.25 -2.5 8.0022 -0.25 -2.5912
  [3,15,7.3347,-0.25,-2.4883,4.5731,-0.25,-2.5,8.0022,-0.25,-2.5912],
// 4 15 6.9663 -0.25 -1.03 7.3233 -0.25 -1.7901 8.002 -0.25 -2.0445 8.8113 -0.25 -1.6835
  [4,15,6.9663,-0.25,-1.03,7.3233,-0.25,-1.7901,8.002,-0.25,-2.0445,8.8113,-0.25,-1.6835],
// 4 15 10.9419 -0.25 -2.1184 9.4176 -0.25 -1.9353 8.8046 -0.25 -2.4271 11.5084 -0.25 -2.473
  [4,15,10.9419,-0.25,-2.1184,9.4176,-0.25,-1.9353,8.8046,-0.25,-2.4271,11.5084,-0.25,-2.473],
// 4 15 9.4176 -0.25 -1.9353 10.9419 -0.25 -2.1184 10.5751 -0.25 -1.5873 9.7377 -0.25 -1.3515
  [4,15,9.4176,-0.25,-1.9353,10.9419,-0.25,-2.1184,10.5751,-0.25,-1.5873,9.7377,-0.25,-1.3515],
// 4 15 11.5084 -0.25 -2.473 8.8046 -0.25 -2.4271 8.0022 -0.25 -2.5912 15.5 -0.25 -5.5
  [4,15,11.5084,-0.25,-2.473,8.8046,-0.25,-2.4271,8.0022,-0.25,-2.5912,15.5,-0.25,-5.5],
// 4 15 6.9663 -0.25 -1.03 8.8113 -0.25 -1.6835 9.1401 -0.25 -0.7256 7.9895 -0.25 0.4979
  [4,15,6.9663,-0.25,-1.03,8.8113,-0.25,-1.6835,9.1401,-0.25,-0.7256,7.9895,-0.25,0.4979],
// 4 15 7.4113 -0.25 0.3503 7.0079 -0.25 -0.0321 6.9663 -0.25 -1.03 7.9895 -0.25 0.4979
  [4,15,7.4113,-0.25,0.3503,7.0079,-0.25,-0.0321,6.9663,-0.25,-1.03,7.9895,-0.25,0.4979],
// 4 15 9.8442 -0.25 -0.6681 9.7377 -0.25 -1.3515 10.4529 -0.25 -0.9394 10.7195 -0.25 -0.0583
  [4,15,9.8442,-0.25,-0.6681,9.7377,-0.25,-1.3515,10.4529,-0.25,-0.9394,10.7195,-0.25,-0.0583],
// 3 15 10.4529 -0.25 -0.9394 9.7377 -0.25 -1.3515 10.5751 -0.25 -1.5873
  [3,15,10.4529,-0.25,-0.9394,9.7377,-0.25,-1.3515,10.5751,-0.25,-1.5873],
// 4 15 9.7226 -0.25 0.0318 9.8442 -0.25 -0.6681 10.7195 -0.25 -0.0583 10.8674 -0.25 0.8557
  [4,15,9.7226,-0.25,0.0318,9.8442,-0.25,-0.6681,10.7195,-0.25,-0.0583,10.8674,-0.25,0.8557],
// 3 15 12.2292 -0.25 -2.5912 11.5084 -0.25 -2.473 15.5 -0.25 -5.5
  [3,15,12.2292,-0.25,-2.5912,11.5084,-0.25,-2.473,15.5,-0.25,-5.5],
// 4 15 11.2649 -0.25 -1.4898 11.6637 -0.25 -1.8995 12.2345 -0.25 -2.0445 11.1319 -0.25 -0.9426
  [4,15,11.2649,-0.25,-1.4898,11.6637,-0.25,-1.8995,12.2345,-0.25,-2.0445,11.1319,-0.25,-0.9426],
// 3 15 12.95 -0.25 -2.4732 15.5 -0.25 -5.5 13.5163 -0.25 -2.1203
  [3,15,12.95,-0.25,-2.4732,15.5,-0.25,-5.5,13.5163,-0.25,-2.1203],
// 3 15 15.5 -0.25 -5.5 12.95 -0.25 -2.4732 12.2292 -0.25 -2.5912
  [3,15,15.5,-0.25,-5.5,12.95,-0.25,-2.4732,12.2292,-0.25,-2.5912],
// 3 15 15.5 -0.25 -5.5 13.8831 -0.25 -1.5942 13.5163 -0.25 -2.1203
  [3,15,15.5,-0.25,-5.5,13.8831,-0.25,-1.5942,13.5163,-0.25,-2.1203],
// 4 15 12.2345 -0.25 -2.0445 13.0187 -0.25 -1.7397 13.3263 -0.25 -0.9646 12.2125 -0.25 0.1375
  [4,15,12.2345,-0.25,-2.0445,13.0187,-0.25,-1.7397,13.3263,-0.25,-0.9646,12.2125,-0.25,0.1375],
// 3 15 13.3263 -0.25 -0.9646 13.0094 -0.25 -0.1746 12.2125 -0.25 0.1375
  [3,15,13.3263,-0.25,-0.9646,13.0094,-0.25,-0.1746,12.2125,-0.25,0.1375],
// 4 15 12.2125 -0.25 0.1375 11.4377 -0.25 -0.1709 11.1319 -0.25 -0.9426 12.2345 -0.25 -2.0445
  [4,15,12.2125,-0.25,0.1375,11.4377,-0.25,-0.1709,11.1319,-0.25,-0.9426,12.2345,-0.25,-2.0445],
// 4 15 15.5 -0.25 5.5 13.7469 -0.25 -0.097 14.0055 -0.25 -0.9577 15.5 -0.25 -5.5
  [4,15,15.5,-0.25,5.5,13.7469,-0.25,-0.097,14.0055,-0.25,-0.9577,15.5,-0.25,-5.5],
// 3 15 13.8831 -0.25 -1.5942 15.5 -0.25 -5.5 14.0055 -0.25 -0.9577
  [3,15,13.8831,-0.25,-1.5942,15.5,-0.25,-5.5,14.0055,-0.25,-0.9577],
// 3 15 9.1401 -0.25 -0.7256 8.8237 -0.25 0.1699 7.9895 -0.25 0.4979
  [3,15,9.1401,-0.25,-0.7256,8.8237,-0.25,0.1699,7.9895,-0.25,0.4979],
// 3 15 10.7195 -0.25 -0.0583 11.4798 -0.25 0.4253 10.8674 -0.25 0.8557
  [3,15,10.7195,-0.25,-0.0583,11.4798,-0.25,0.4253,10.8674,-0.25,0.8557],
// 4 15 9.3585 -0.25 0.5918 9.7226 -0.25 0.0318 10.8674 -0.25 0.8557 10.6681 -0.25 1.5253
  [4,15,9.3585,-0.25,0.5918,9.7226,-0.25,0.0318,10.8674,-0.25,0.8557,10.6681,-0.25,1.5253],
// 4 15 8.1668 -0.25 1.0817 8.8179 -0.25 0.959 9.5917 -0.25 2.1913 7.438 -0.25 2.1913
  [4,15,8.1668,-0.25,1.0817,8.8179,-0.25,0.959,9.5917,-0.25,2.1913,7.438,-0.25,2.1913],
// 4 15 9.5917 -0.25 2.1913 8.8179 -0.25 0.959 9.3585 -0.25 0.5918 10.6681 -0.25 1.5253
  [4,15,9.5917,-0.25,2.1913,8.8179,-0.25,0.959,9.3585,-0.25,0.5918,10.6681,-0.25,1.5253],
// 3 15 8.1668 -0.25 1.0817 7.438 -0.25 2.1913 7.1479 -0.25 0.7439
  [3,15,8.1668,-0.25,1.0817,7.438,-0.25,2.1913,7.1479,-0.25,0.7439],
// 4 15 11.0913 -0.25 2.5149 11.5848 -0.25 2.8156 9.5917 -0.25 2.8249 9.5917 -0.25 2.1913
  [4,15,11.0913,-0.25,2.5149,11.5848,-0.25,2.8156,9.5917,-0.25,2.8249,9.5917,-0.25,2.1913],
// 3 15 11.0913 -0.25 2.5149 9.5917 -0.25 2.1913 10.6681 -0.25 1.5253
  [3,15,11.0913,-0.25,2.5149,9.5917,-0.25,2.1913,10.6681,-0.25,1.5253],
// 4 15 12.2345 -0.25 0.68 12.8631 -0.25 0.9206 13.1069 -0.25 1.51 12.8557 -0.25 2.1213
  [4,15,12.2345,-0.25,0.68,12.8631,-0.25,0.9206,13.1069,-0.25,1.51,12.8557,-0.25,2.1213],
// 4 15 11.3473 -0.25 1.5468 12.2345 -0.25 0.68 12.2271 -0.25 2.3694 11.5964 -0.25 2.1269
  [4,15,11.3473,-0.25,1.5468,12.2345,-0.25,0.68,12.2271,-0.25,2.3694,11.5964,-0.25,2.1269],
// 3 15 13.5895 -0.25 0.8538 12.9927 -0.25 0.4253 13.7469 -0.25 -0.097
  [3,15,13.5895,-0.25,0.8538,12.9927,-0.25,0.4253,13.7469,-0.25,-0.097],
// 4 15 13.7861 -0.25 1.5071 13.5895 -0.25 0.8538 13.7469 -0.25 -0.097 15.5 -0.25 5.5
  [4,15,13.7861,-0.25,1.5071,13.5895,-0.25,0.8538,13.7469,-0.25,-0.097,15.5,-0.25,5.5],
// 4 15 12.2178 -0.25 2.9161 15.5 -0.25 5.5 9.5917 -0.25 2.8249 11.5848 -0.25 2.8156
  [4,15,12.2178,-0.25,2.9161,15.5,-0.25,5.5,9.5917,-0.25,2.8249,11.5848,-0.25,2.8156],
// 3 15 12.8557 -0.25 2.8135 15.5 -0.25 5.5 12.2178 -0.25 2.9161
  [3,15,12.8557,-0.25,2.8135,15.5,-0.25,5.5,12.2178,-0.25,2.9161],
// 3 15 15.5 -0.25 5.5 12.8557 -0.25 2.8135 13.3552 -0.25 2.5059
  [3,15,15.5,-0.25,5.5,12.8557,-0.25,2.8135,13.3552,-0.25,2.5059],
// 3 15 13.7861 -0.25 1.5071 15.5 -0.25 5.5 13.3552 -0.25 2.5059
  [3,15,13.7861,-0.25,1.5071,15.5,-0.25,5.5,13.3552,-0.25,2.5059],
// 3 15 12.2345 -0.25 0.68 12.8557 -0.25 2.1213 12.2271 -0.25 2.3694
  [3,15,12.2345,-0.25,0.68,12.8557,-0.25,2.1213,12.2271,-0.25,2.3694],
// 3 15 11.3473 -0.25 1.5468 11.5927 -0.25 0.9225 12.2345 -0.25 0.68
  [3,15,11.3473,-0.25,1.5468,11.5927,-0.25,0.9225,12.2345,-0.25,0.68],
];
makepoly(ldraw_lib__4521703g(), line=0.2);
